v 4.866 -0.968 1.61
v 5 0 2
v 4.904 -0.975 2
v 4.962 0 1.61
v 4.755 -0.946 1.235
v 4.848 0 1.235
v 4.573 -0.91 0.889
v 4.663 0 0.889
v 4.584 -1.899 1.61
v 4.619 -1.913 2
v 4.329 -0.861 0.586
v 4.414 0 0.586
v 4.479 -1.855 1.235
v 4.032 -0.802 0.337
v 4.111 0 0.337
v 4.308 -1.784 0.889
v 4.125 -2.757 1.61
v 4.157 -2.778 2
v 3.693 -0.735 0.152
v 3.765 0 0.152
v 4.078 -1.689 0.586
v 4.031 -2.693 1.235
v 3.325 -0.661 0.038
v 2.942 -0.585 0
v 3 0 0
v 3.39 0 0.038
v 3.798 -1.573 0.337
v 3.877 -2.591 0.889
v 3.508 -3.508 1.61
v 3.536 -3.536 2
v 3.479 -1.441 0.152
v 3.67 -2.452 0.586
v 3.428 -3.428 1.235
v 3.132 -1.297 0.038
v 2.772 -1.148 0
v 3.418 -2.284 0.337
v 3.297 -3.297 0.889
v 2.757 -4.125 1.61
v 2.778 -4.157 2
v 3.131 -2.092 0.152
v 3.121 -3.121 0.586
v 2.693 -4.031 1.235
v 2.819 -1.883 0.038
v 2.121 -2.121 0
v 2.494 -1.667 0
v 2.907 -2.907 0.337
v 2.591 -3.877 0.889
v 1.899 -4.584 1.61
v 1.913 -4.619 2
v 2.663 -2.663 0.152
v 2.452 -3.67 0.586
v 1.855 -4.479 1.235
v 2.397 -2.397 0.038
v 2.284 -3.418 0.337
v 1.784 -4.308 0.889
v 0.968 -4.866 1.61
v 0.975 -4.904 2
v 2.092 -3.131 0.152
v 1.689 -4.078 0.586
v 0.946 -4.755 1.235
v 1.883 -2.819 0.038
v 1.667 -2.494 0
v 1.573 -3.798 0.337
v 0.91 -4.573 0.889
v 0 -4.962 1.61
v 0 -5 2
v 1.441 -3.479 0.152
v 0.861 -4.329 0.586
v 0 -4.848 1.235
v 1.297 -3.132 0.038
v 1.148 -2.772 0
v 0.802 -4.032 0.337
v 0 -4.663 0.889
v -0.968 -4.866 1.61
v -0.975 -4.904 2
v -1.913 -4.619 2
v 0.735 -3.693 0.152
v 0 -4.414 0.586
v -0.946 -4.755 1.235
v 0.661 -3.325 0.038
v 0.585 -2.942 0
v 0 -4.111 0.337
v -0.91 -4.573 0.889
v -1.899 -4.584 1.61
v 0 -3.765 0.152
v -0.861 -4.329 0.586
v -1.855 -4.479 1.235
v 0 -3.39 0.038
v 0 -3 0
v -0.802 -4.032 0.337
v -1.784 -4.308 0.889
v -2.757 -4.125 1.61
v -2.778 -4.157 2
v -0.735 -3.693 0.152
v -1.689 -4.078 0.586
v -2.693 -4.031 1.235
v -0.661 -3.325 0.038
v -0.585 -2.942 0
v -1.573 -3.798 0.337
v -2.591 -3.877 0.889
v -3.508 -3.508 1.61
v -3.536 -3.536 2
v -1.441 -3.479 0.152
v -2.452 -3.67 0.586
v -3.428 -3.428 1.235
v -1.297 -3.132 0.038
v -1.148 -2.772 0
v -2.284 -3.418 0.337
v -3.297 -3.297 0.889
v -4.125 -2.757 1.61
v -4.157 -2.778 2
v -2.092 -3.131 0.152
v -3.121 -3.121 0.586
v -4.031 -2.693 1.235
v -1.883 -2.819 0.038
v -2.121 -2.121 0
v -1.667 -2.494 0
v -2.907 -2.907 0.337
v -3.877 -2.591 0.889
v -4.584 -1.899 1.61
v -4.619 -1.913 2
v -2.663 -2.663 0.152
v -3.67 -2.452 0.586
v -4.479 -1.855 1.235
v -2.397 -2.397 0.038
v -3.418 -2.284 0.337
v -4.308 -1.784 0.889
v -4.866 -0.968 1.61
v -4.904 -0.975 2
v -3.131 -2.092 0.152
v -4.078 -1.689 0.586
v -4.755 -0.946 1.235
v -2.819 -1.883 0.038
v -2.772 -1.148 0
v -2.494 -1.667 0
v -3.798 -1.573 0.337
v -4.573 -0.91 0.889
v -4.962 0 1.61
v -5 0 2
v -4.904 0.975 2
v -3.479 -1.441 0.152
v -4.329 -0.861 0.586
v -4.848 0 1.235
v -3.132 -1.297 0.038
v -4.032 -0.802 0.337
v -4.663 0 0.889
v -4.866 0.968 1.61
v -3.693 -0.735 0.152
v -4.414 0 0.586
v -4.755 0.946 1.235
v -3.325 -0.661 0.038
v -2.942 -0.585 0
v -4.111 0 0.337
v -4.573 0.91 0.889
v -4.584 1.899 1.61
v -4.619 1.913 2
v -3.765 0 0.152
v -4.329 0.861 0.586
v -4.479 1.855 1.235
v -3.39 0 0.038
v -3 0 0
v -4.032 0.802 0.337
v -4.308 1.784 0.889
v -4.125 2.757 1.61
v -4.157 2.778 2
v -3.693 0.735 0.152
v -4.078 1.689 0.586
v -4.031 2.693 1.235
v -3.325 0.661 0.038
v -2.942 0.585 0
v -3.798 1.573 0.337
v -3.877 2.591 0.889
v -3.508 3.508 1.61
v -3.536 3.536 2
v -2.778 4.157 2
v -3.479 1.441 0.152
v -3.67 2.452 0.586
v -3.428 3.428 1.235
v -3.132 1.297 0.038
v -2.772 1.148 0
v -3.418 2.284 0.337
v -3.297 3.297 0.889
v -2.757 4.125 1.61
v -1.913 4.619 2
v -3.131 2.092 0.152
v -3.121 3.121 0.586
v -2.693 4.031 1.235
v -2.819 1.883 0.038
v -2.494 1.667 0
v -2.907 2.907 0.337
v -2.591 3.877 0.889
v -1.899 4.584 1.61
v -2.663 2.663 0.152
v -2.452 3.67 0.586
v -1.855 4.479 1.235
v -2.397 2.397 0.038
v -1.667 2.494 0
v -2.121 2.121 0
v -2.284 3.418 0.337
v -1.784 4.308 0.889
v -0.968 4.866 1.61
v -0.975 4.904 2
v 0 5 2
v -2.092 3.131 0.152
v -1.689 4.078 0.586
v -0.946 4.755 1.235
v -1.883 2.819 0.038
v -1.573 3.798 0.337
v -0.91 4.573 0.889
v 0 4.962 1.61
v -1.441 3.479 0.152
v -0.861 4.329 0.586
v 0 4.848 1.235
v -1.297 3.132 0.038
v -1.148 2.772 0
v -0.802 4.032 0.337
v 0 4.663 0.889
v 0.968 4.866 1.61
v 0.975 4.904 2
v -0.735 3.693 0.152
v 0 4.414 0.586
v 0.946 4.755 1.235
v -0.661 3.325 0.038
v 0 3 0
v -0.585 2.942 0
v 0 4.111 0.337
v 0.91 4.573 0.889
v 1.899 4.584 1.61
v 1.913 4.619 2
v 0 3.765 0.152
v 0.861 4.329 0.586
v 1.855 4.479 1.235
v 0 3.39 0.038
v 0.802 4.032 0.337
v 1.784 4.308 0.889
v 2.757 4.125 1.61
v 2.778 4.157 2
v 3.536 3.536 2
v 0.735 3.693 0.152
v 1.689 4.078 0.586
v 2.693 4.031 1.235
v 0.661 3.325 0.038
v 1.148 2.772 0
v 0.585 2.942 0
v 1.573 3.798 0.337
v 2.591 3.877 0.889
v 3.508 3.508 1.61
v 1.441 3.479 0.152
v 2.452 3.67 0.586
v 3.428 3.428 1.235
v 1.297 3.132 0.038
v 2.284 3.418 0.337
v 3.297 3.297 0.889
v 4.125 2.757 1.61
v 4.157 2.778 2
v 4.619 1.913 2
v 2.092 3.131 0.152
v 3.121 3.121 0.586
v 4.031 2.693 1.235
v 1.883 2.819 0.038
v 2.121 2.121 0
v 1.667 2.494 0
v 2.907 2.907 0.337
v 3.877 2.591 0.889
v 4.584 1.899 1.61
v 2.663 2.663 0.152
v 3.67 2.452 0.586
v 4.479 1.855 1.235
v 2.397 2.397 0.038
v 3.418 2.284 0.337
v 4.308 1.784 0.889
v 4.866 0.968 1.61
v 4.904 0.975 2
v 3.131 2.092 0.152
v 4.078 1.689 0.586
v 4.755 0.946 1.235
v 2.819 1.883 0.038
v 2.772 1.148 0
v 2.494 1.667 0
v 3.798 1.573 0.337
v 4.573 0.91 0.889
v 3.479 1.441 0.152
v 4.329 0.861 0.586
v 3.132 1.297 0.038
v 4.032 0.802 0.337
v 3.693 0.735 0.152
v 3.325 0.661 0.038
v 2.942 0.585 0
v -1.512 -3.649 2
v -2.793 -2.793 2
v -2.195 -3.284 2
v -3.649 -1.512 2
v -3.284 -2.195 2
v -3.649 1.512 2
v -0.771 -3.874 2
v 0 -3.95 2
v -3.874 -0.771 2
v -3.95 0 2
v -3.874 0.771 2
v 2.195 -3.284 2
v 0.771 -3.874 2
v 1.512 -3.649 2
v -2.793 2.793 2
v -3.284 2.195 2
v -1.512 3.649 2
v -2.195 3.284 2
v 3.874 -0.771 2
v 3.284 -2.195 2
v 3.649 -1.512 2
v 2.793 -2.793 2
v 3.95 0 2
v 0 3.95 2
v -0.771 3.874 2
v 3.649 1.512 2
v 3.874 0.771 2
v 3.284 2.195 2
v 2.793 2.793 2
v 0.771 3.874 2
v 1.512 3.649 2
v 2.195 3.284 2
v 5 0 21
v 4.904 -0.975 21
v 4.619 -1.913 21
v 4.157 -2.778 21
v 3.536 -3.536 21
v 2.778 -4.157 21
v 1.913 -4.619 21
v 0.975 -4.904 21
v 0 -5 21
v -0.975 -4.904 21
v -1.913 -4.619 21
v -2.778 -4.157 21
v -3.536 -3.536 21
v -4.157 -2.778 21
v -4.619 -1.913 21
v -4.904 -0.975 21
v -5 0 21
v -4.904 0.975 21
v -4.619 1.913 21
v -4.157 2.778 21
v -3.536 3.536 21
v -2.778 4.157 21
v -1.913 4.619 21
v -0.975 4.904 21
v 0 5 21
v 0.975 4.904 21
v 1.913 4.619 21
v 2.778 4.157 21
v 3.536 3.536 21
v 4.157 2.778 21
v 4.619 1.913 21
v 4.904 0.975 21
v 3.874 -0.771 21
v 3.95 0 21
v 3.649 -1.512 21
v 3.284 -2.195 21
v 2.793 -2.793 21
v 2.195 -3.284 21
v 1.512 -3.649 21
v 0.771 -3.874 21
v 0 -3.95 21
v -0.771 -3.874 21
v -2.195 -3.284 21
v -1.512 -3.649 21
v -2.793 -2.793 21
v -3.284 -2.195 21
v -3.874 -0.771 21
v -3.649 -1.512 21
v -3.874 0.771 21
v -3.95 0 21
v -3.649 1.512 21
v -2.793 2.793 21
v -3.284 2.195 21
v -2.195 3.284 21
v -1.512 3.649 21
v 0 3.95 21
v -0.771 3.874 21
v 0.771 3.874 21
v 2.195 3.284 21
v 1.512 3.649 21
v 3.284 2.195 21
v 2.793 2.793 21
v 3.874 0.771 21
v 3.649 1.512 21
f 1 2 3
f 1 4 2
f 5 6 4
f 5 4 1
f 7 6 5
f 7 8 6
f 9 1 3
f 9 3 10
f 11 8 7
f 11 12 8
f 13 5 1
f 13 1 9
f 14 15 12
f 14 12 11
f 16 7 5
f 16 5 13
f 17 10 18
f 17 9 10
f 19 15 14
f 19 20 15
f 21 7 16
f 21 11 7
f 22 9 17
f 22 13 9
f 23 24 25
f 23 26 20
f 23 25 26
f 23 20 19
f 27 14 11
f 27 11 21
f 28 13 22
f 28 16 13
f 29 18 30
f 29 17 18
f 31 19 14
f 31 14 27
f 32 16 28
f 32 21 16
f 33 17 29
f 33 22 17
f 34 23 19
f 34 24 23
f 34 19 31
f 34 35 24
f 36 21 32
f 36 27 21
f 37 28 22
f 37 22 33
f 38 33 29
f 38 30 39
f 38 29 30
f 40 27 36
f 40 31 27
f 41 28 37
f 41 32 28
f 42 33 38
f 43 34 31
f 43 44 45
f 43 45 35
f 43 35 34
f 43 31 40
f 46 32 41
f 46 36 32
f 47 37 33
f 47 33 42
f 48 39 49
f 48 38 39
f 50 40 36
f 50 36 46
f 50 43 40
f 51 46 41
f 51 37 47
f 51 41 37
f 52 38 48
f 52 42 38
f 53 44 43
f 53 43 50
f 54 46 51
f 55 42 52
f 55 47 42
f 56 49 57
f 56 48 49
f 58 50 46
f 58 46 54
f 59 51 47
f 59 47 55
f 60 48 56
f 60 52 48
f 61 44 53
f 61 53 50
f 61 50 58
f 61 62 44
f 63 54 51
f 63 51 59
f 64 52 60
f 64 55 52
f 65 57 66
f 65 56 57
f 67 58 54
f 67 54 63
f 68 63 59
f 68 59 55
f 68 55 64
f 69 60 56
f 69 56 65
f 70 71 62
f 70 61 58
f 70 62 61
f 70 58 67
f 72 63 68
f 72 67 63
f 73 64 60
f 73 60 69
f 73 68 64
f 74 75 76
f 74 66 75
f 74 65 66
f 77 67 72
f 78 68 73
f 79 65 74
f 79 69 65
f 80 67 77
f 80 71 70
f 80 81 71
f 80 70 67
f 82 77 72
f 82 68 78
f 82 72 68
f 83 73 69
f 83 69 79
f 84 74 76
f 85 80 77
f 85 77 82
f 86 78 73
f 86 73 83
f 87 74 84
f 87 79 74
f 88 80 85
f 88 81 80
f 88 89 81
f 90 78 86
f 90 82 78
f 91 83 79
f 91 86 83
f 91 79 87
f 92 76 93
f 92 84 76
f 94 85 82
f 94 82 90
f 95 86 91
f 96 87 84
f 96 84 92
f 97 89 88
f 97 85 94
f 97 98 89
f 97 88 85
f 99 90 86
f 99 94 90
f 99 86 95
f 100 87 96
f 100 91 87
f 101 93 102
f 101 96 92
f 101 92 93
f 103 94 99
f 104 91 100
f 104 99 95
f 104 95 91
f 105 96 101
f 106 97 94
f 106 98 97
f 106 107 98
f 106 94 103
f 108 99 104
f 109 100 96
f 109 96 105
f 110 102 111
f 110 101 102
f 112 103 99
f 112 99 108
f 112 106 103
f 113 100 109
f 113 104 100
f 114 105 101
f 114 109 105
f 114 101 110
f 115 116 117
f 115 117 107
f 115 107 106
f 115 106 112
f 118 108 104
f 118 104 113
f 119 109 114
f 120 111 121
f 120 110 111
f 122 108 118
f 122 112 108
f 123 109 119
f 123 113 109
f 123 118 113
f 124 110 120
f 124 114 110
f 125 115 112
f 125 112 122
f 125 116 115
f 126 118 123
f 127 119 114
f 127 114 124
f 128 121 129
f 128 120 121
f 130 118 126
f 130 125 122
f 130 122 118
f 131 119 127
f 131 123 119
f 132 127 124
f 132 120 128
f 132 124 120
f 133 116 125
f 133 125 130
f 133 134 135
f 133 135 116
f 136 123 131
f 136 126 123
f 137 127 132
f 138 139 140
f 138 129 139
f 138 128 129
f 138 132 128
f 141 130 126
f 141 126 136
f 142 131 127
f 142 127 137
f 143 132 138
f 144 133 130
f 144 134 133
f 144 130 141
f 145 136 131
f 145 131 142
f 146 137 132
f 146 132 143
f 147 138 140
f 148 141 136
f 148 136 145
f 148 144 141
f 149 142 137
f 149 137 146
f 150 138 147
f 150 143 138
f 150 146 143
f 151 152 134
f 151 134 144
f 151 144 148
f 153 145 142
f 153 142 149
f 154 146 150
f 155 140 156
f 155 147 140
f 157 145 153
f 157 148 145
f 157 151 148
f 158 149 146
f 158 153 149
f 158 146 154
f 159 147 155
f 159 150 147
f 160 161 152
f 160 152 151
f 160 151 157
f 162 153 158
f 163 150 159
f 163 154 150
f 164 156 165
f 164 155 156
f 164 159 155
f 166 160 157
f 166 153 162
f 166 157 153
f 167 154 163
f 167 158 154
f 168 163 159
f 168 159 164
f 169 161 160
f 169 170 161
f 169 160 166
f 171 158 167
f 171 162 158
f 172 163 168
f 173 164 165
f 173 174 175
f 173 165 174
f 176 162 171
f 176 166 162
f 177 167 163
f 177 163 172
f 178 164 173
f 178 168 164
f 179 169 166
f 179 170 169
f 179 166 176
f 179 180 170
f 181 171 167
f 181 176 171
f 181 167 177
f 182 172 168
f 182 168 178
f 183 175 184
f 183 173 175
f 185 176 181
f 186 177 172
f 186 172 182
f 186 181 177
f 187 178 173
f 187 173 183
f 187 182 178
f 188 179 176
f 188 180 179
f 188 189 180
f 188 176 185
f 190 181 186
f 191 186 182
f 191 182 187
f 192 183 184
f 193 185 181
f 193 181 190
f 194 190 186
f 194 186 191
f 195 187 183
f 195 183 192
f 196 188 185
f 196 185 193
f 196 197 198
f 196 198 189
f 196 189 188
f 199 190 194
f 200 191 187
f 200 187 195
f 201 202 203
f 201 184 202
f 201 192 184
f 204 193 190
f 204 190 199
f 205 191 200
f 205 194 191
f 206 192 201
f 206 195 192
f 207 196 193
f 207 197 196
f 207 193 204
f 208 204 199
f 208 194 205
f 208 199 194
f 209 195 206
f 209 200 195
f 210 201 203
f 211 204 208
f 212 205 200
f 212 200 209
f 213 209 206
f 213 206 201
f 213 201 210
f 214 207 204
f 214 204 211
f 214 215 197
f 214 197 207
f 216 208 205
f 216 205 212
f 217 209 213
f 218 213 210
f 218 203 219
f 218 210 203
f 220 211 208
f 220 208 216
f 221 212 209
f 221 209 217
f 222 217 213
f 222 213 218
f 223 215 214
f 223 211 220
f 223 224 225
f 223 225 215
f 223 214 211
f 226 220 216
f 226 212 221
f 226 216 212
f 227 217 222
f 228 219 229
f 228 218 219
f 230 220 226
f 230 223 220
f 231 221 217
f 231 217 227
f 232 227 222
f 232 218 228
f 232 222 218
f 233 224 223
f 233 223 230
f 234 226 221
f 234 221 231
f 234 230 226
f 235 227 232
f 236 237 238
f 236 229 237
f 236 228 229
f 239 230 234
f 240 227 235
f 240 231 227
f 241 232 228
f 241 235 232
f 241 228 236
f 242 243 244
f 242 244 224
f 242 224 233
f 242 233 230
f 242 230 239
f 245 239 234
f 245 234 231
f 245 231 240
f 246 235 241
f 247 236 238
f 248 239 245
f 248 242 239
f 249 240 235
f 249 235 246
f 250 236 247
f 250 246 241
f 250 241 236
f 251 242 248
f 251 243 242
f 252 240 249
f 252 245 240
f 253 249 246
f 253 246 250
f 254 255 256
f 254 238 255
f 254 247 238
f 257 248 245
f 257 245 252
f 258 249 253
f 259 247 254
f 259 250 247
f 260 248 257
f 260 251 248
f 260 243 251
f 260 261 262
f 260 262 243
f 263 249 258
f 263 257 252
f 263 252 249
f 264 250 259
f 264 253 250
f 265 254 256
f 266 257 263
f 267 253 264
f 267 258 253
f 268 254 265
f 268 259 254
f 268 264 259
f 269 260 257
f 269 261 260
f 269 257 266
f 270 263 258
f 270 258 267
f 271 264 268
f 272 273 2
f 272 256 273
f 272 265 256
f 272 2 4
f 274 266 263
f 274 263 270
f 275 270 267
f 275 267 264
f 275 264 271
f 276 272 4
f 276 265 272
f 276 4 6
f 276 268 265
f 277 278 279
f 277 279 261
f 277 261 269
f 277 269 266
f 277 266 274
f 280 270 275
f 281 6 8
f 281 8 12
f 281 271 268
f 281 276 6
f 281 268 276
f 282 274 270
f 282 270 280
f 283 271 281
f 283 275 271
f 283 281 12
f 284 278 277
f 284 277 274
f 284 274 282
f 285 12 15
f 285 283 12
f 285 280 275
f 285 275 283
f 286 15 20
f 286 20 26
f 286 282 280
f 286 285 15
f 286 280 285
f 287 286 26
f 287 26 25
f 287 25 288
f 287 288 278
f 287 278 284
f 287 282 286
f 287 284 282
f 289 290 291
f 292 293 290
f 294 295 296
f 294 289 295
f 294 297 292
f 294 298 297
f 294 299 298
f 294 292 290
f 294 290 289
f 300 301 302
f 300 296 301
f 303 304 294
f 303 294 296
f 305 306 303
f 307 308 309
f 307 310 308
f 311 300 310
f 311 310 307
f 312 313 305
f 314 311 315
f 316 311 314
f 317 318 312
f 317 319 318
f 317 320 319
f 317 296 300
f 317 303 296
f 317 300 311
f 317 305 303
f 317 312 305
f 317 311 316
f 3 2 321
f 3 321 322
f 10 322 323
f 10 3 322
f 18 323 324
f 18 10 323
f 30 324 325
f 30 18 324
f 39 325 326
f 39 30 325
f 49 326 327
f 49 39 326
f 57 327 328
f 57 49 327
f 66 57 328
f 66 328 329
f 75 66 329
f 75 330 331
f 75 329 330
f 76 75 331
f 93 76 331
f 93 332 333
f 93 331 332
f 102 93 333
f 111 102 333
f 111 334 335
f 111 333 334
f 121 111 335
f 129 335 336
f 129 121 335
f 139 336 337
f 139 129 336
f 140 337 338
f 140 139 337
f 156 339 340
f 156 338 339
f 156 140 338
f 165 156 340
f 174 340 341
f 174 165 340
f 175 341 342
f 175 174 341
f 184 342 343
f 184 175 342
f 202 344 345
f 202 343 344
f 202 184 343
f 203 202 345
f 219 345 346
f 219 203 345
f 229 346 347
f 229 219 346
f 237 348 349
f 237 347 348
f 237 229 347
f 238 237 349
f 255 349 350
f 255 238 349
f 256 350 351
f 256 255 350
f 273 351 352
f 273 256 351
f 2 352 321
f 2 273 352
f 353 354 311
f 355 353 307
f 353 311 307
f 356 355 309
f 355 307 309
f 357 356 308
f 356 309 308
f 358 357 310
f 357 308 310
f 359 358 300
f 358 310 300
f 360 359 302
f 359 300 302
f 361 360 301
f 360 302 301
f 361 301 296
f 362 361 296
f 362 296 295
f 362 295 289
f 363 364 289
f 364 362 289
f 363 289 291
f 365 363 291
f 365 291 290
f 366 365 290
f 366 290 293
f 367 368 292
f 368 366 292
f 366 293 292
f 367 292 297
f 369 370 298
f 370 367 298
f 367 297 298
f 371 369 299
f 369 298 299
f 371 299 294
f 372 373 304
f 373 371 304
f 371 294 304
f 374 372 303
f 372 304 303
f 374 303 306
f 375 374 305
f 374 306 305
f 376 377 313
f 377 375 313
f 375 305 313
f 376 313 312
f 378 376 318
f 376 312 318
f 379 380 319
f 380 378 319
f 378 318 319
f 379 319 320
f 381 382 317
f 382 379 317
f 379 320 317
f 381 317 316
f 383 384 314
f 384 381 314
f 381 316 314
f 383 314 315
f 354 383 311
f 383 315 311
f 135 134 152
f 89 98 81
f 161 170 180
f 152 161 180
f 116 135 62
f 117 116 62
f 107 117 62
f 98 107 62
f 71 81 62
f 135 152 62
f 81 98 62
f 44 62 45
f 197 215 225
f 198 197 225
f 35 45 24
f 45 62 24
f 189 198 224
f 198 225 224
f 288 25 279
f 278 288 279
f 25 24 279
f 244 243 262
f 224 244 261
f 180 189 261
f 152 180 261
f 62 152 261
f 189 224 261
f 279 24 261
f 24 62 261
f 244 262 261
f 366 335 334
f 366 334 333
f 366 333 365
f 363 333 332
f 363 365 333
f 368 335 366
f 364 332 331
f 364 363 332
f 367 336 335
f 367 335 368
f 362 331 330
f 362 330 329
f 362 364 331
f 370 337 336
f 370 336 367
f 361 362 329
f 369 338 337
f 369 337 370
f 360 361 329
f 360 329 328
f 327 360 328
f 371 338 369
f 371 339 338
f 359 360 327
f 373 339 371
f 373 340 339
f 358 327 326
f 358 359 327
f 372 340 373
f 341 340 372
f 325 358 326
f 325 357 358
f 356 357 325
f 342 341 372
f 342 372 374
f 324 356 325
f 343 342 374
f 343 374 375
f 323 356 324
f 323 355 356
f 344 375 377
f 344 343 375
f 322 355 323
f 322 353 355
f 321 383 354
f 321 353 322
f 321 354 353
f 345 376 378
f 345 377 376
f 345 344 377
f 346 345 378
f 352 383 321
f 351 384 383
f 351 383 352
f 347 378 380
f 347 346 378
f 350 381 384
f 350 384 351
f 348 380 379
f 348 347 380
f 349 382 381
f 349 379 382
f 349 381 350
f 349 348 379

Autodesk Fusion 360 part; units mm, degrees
sketch "Sketch1" plane through (0, 0, 0) normal (0, 0, 1) x (1, 0, 0)
  circle A0 centre (0, 0) radius 5
  circle A1 centre (0, 0) radius 3.95
  dimension "d1" = 10
  dimension "d2" = 7.9
extrude "Extrude1" add sketch "Sketch1" along normal blind 2 contours A0 | A1
extrude "Extrude2" add sketch "Sketch1" along normal blind 21
fillet "Fillet1" radius 2 1 edges at (-4.6616, -1.8081, 0)
